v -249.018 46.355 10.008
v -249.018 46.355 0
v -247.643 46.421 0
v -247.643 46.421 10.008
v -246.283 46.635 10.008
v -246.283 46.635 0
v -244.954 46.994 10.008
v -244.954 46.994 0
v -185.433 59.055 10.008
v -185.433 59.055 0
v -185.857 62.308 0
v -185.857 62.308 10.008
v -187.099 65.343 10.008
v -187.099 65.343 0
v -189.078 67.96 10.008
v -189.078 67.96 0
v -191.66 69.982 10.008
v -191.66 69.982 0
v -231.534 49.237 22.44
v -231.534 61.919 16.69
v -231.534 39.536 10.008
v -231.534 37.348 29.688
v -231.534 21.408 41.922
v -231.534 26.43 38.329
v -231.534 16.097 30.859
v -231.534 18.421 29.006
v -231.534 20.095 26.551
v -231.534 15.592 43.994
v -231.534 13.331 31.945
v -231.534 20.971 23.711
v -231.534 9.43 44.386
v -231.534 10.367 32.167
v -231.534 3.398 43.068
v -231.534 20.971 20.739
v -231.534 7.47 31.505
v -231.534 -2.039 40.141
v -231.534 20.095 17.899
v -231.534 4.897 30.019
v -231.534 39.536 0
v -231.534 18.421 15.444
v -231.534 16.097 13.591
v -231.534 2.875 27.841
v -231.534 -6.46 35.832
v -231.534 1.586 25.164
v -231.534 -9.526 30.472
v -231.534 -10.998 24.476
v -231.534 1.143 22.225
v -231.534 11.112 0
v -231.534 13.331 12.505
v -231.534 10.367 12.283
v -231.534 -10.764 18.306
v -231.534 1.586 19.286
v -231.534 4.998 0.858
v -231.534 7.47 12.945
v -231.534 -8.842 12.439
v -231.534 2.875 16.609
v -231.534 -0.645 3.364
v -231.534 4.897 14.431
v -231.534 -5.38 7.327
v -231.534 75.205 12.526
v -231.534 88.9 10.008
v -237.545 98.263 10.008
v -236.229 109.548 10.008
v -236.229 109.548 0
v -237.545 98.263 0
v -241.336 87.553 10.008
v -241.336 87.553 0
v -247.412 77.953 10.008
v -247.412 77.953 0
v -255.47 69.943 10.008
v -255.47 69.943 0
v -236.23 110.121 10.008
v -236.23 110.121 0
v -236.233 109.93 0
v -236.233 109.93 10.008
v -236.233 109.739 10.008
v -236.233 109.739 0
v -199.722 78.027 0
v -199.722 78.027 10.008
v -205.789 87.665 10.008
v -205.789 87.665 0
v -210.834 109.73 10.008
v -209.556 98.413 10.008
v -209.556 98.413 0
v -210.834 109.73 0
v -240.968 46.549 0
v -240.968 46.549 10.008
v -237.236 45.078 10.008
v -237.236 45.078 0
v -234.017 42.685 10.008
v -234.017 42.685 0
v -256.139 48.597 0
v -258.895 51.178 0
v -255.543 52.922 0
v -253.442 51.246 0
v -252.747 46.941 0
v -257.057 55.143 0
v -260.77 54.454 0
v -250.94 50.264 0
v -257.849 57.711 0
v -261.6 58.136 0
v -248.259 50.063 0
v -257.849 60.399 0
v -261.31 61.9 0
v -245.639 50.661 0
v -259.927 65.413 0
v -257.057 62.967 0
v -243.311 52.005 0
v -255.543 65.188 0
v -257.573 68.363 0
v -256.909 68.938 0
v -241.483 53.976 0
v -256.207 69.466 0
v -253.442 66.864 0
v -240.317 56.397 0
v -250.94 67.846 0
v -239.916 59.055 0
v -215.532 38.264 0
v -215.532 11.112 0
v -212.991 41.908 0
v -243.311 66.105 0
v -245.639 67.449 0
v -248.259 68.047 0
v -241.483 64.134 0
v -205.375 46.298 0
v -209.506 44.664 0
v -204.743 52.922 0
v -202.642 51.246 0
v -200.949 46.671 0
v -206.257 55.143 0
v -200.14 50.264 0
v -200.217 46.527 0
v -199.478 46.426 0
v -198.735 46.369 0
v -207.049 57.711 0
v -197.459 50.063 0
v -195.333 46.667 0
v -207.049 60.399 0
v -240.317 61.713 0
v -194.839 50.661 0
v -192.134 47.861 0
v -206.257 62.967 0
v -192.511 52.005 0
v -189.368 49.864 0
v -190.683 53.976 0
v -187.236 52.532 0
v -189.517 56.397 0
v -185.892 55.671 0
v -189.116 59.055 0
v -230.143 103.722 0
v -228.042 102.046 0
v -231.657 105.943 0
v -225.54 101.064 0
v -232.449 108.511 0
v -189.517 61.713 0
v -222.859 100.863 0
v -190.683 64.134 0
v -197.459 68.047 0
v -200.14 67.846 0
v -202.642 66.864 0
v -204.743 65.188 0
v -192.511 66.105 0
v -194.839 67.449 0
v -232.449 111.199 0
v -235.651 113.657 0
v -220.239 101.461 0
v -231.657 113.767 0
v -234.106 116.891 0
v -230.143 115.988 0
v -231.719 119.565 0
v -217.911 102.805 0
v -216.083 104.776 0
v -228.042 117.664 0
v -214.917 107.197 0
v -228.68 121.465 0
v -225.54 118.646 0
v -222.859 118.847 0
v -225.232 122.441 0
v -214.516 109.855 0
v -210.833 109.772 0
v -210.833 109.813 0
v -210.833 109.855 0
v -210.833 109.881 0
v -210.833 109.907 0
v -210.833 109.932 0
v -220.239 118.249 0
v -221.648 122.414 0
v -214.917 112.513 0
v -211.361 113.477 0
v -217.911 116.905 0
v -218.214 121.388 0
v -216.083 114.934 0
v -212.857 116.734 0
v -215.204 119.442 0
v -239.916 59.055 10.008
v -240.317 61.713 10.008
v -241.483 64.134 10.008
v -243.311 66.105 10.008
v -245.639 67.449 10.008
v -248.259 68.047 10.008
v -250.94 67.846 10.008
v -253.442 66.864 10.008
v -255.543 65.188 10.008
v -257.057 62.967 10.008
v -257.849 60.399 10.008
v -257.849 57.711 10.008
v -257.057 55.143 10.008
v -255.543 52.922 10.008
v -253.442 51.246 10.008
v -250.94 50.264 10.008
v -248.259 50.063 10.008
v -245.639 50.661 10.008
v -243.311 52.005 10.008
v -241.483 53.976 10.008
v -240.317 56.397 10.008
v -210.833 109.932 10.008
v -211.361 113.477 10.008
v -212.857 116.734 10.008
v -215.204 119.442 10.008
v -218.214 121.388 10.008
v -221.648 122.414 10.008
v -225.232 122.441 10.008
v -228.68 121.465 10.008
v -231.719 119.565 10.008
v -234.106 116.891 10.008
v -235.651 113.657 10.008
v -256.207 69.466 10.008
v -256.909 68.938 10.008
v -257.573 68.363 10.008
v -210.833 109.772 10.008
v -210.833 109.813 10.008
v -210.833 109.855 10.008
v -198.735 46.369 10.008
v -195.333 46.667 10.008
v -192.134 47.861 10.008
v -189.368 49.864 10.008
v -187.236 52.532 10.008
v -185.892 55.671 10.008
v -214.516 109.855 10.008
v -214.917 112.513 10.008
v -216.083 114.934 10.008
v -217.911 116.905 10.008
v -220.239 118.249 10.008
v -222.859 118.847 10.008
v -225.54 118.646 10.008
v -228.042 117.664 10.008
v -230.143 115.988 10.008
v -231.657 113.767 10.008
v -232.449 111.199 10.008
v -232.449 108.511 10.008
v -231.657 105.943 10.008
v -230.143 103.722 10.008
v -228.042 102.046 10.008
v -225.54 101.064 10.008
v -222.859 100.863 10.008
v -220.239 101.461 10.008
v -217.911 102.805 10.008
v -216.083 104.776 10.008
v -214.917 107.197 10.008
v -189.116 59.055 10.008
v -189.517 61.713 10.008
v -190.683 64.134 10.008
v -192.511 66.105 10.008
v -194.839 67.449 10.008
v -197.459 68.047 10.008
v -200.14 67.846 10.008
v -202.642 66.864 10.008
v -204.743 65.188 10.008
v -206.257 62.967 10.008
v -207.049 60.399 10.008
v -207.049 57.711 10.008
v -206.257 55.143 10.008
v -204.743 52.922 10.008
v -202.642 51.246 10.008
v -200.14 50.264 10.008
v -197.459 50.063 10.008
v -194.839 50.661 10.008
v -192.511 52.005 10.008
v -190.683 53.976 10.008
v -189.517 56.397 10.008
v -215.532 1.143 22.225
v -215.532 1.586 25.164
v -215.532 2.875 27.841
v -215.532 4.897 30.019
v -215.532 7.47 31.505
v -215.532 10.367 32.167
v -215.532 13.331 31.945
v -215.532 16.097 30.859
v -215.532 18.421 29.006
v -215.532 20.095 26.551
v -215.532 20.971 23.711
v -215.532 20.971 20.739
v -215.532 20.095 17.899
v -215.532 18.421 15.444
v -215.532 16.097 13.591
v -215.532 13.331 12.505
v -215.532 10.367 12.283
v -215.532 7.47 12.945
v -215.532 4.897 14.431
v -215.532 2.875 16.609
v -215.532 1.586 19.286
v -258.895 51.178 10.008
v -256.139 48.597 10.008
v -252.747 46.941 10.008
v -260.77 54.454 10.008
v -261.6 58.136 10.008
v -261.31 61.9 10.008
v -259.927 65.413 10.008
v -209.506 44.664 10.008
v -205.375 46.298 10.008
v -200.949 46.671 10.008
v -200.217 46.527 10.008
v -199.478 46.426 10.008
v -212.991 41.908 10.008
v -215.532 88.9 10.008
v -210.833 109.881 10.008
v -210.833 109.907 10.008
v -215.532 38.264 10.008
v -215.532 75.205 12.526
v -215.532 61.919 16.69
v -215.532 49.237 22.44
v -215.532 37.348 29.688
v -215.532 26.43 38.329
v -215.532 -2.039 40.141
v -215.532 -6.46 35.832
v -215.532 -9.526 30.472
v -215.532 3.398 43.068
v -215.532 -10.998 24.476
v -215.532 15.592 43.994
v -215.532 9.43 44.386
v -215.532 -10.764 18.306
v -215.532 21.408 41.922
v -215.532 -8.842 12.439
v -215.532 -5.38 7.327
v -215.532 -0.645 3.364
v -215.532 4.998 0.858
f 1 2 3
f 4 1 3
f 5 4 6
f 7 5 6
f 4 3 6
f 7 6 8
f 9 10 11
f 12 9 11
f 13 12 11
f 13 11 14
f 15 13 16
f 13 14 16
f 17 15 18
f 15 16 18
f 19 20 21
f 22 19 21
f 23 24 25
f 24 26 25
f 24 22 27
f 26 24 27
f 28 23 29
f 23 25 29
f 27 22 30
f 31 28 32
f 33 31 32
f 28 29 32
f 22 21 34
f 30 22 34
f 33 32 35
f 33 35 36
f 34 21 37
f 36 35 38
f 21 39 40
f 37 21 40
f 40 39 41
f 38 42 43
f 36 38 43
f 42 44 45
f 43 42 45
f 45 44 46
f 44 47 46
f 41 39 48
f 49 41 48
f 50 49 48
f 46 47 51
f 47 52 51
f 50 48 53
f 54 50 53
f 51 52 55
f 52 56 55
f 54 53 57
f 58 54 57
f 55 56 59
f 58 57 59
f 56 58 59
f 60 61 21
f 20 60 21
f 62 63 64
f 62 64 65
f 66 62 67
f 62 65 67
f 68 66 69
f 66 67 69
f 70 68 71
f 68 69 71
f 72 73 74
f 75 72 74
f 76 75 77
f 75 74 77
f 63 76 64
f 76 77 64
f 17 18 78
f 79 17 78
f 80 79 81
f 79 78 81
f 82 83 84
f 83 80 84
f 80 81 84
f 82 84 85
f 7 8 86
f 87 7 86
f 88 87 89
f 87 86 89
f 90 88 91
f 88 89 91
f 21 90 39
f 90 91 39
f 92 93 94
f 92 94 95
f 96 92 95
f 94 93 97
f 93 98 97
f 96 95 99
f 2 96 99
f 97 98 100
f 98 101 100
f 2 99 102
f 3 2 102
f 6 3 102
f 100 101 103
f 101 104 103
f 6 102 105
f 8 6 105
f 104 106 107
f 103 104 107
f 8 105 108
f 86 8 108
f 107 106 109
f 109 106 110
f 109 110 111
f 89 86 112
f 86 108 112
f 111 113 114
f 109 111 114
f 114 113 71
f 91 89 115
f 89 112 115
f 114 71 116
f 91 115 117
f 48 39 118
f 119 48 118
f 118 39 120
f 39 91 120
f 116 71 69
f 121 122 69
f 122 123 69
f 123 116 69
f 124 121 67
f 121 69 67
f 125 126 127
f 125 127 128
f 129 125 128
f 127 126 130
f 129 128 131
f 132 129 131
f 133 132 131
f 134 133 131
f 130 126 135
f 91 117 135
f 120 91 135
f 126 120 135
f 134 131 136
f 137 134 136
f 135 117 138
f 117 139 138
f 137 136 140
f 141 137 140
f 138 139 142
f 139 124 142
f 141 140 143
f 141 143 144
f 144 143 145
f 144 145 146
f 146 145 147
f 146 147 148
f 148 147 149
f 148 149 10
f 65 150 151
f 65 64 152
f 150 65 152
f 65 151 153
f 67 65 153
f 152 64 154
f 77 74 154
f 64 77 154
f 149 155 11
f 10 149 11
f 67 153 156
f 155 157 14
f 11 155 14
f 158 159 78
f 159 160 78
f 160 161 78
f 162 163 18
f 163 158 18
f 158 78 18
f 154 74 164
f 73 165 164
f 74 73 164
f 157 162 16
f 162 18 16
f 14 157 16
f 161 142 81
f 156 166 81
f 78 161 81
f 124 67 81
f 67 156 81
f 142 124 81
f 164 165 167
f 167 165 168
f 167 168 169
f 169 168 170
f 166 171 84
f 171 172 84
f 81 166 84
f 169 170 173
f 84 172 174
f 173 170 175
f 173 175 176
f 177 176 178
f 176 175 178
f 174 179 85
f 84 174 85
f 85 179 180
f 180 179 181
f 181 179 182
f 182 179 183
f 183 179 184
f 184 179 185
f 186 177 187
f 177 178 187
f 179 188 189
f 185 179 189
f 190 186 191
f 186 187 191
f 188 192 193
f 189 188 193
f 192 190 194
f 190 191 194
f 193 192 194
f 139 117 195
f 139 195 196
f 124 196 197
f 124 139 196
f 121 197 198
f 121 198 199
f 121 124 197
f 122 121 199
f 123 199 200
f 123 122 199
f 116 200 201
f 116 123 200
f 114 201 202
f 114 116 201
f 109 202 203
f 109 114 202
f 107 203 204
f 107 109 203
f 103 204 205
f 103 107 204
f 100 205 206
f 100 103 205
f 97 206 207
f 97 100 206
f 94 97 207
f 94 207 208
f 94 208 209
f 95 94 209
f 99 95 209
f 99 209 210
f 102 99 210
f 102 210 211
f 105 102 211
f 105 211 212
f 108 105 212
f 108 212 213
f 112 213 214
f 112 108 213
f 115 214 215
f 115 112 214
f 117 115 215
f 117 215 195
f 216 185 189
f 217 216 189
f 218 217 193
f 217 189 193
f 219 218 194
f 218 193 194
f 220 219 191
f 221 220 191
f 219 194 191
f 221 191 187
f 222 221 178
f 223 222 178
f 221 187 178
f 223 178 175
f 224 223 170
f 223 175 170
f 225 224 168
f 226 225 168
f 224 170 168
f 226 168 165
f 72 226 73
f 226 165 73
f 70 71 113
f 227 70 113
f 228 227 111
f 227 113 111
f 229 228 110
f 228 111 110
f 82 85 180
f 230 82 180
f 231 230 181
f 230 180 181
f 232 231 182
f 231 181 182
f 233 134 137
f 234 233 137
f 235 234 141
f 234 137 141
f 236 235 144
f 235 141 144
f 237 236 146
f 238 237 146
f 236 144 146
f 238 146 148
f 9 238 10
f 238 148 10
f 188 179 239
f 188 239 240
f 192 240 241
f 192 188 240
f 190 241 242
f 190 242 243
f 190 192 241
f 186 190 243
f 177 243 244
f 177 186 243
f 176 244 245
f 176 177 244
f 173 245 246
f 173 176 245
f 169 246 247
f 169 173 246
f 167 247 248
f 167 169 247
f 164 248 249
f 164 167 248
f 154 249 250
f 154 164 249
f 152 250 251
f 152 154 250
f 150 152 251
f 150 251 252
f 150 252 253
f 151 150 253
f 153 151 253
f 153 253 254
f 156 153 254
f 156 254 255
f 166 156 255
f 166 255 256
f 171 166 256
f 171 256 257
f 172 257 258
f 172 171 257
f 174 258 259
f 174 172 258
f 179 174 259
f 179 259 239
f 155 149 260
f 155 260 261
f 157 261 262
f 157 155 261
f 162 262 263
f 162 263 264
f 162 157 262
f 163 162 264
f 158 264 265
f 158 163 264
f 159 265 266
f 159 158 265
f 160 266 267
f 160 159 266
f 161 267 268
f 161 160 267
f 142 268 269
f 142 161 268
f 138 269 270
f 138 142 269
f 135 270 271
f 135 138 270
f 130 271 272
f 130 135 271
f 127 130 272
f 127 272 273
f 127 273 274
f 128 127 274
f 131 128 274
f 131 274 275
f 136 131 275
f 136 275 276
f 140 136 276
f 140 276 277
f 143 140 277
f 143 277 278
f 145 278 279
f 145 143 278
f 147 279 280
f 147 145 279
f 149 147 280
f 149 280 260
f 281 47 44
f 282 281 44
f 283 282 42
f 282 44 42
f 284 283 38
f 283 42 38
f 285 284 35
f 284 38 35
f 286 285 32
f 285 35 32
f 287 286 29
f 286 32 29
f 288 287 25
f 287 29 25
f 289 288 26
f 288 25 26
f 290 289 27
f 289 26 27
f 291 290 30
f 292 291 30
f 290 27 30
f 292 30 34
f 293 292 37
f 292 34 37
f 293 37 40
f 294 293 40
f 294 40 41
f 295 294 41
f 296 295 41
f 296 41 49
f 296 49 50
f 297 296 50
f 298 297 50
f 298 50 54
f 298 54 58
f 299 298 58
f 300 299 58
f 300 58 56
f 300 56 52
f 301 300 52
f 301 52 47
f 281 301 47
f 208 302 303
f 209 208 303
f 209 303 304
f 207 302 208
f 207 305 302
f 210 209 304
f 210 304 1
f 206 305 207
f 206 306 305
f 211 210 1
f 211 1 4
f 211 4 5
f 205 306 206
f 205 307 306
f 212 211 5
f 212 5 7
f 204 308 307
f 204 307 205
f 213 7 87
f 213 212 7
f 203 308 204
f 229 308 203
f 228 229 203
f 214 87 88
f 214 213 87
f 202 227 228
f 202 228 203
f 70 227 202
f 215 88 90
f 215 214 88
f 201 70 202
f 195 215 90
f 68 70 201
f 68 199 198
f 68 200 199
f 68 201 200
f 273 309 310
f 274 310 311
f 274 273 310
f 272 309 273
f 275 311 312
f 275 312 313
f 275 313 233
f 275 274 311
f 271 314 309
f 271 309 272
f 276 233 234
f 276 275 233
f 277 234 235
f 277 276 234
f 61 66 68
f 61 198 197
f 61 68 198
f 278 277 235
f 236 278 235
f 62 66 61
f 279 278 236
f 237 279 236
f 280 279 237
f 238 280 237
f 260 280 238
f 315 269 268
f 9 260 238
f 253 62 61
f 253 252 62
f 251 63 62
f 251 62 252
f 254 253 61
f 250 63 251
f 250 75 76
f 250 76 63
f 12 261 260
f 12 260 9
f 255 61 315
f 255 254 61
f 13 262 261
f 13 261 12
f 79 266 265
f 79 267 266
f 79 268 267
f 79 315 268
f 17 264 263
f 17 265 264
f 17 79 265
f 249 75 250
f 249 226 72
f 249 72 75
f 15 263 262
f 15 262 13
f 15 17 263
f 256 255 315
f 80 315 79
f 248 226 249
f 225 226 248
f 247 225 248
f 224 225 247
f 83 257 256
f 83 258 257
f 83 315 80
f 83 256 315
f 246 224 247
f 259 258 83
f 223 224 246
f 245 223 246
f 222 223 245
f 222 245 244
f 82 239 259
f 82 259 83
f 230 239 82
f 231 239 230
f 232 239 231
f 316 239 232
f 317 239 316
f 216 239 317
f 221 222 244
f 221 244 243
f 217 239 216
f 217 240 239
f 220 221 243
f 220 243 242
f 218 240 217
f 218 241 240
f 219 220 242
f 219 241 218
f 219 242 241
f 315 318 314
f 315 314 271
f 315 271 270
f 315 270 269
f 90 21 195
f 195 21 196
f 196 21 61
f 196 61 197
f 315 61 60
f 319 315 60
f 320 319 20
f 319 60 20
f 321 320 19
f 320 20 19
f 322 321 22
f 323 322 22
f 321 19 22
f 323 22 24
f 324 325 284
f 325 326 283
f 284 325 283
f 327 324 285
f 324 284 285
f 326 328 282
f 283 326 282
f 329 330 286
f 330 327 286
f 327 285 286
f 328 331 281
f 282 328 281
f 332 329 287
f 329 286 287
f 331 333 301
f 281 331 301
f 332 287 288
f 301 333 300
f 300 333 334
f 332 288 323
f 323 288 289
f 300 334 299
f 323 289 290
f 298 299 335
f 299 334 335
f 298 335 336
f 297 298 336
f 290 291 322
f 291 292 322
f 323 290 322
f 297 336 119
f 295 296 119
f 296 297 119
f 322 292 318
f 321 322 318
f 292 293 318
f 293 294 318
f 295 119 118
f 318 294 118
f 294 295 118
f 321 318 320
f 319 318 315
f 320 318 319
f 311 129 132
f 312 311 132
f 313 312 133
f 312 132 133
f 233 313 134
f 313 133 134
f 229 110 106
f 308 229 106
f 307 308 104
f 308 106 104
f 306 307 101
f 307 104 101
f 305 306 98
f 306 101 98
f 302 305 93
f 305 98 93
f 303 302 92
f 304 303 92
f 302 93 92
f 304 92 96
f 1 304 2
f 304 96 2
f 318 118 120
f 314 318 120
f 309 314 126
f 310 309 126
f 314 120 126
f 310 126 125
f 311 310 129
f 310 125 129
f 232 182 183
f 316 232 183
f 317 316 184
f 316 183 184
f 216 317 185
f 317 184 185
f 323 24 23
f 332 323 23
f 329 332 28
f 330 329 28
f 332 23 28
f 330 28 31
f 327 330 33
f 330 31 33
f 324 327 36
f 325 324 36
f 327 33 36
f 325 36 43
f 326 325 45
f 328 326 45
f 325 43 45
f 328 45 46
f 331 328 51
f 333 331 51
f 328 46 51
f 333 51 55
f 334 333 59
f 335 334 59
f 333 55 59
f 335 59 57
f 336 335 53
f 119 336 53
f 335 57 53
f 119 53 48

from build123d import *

# Parameters (mm, degrees)
F0_W     = 16.002
F0_H     = 11.1125
F1_DEPTH = 76.2
F0_R     = 9.017
F2_DEPTH = 10.0076
F3_R     = 9.9695
F4_DEPTH = 25.4


# Not quite as in the source:
# - a feature names something its author has since deleted; it is built from what else it names


with BuildPart() as f1:
    # F0 (on Top) → F1 (new body)
    with BuildSketch(Plane.XY):
        Polygon((-215.5320961376, 0), (-215.5320961376, 38.263771664), (-215.5320961376, 88.9), (-231.5340961376, 88.9), (-231.5340961376, 39.535600692), (-231.5340961376, 0), align=None)
        with Locations((-223.5330961376, -5.55625)):
            Rectangle(F0_W, F0_H)
    extrude(amount=F1_DEPTH)

    # F0 (on Top) → F2 (join)
    with BuildSketch(Plane.XY):
        with BuildLine():
            ThreePointArc((-210.8337106802, 109.7300639993), (-210.8332497742, 109.7925312439), (-210.8330961376, 109.855))
            ThreePointArc((-210.8330961376, 109.855), (-210.8331549592, 109.8936531274), (-210.8333314233, 109.9323058968))
            ThreePointArc((-210.8333314233, 109.9323058968), (-210.8336216962, 109.8311851368), (-210.8337106802, 109.7300639993))
        make_face()
        with BuildLine():
            ThreePointArc((-210.8337106802, 109.7300639993), (-210.8336216962, 109.8311851368), (-210.8333314233, 109.9323058968))
            ThreePointArc((-210.8333314233, 109.9323058968), (-223.438898877, 122.5546506596), (-236.2303167947, 110.12068324))
            ThreePointArc((-236.2303167947, 110.12068324), (-236.2290424274, 109.8342939205), (-236.229382634, 109.5479019679))
            ThreePointArc((-236.229382634, 109.5479019679), (-223.4420019429, 97.1553267031), (-210.8337106802, 109.7300639993))
        make_face()
        with Locations((-223.5330961376, 109.855)):
            Circle(F0_R, mode=Mode.SUBTRACT)
        with BuildLine():
            ThreePointArc((-191.660374853, 69.9817506227), (-205.7887196825, 87.6651452552), (-210.8337106802, 109.7300639993))
            ThreePointArc((-210.8337106802, 109.7300639993), (-223.4420019429, 97.1553267031), (-236.229382634, 109.5479019679))
            ThreePointArc((-236.229382634, 109.5479019679), (-241.3359242696, 87.5526791762), (-255.4702109751, 69.9433483413))
            ThreePointArc((-255.4702109751, 69.9433483413), (-242.6773531137, 70.1074060375), (-236.2330961376, 59.055))
            ThreePointArc((-236.2330961376, 59.055), (-238.6417428115, 51.6133572568), (-244.9540483765, 46.9944370399))
            ThreePointArc((-244.9540483765, 46.9944370399), (-237.2361698926, 45.078438676), (-231.5340961376, 39.535600692))
            Line((-231.5340961376, 39.535600692), (-231.5340961376, 88.9))
            Line((-231.5340961376, 88.9), (-215.5320961376, 88.9))
            Line((-215.5320961376, 88.9), (-215.5320961376, 38.263771664))
            ThreePointArc((-215.5320961376, 38.263771664), (-209.5064918471, 44.6635464864), (-200.94875069, 46.6710551745))
            ThreePointArc((-200.94875069, 46.6710551745), (-209.9310054796, 63.7559929971), (-191.660374853, 69.9817506227))
        make_face()
        with BuildLine():
            ThreePointArc((-236.229382634, 109.5479019679), (-236.2290424274, 109.8342939205), (-236.2303167947, 110.12068324))
            ThreePointArc((-236.2303167947, 110.12068324), (-236.2330792473, 109.8342873368), (-236.229382634, 109.5479019679))
        make_face()
        with BuildLine():
            ThreePointArc((-185.4330961376, 59.055), (-187.0992037982, 65.343339991), (-191.660374853, 69.9817506227))
            ThreePointArc((-191.660374853, 69.9817506227), (-209.9310054796, 63.7559929971), (-200.94875069, 46.6710551745))
            ThreePointArc((-200.94875069, 46.6710551745), (-199.8363704021, 46.5607848043), (-198.7350651606, 46.3692744277))
            ThreePointArc((-198.7350651606, 46.3692744277), (-189.3682517748, 49.8643796022), (-185.4330961376, 59.055))
        make_face()
        with Locations((-198.1330961376, 59.055)):
            Circle(F0_R, mode=Mode.SUBTRACT)
        with BuildLine():
            ThreePointArc((-257.5728060865, 68.3633517337), (-256.5112816453, 69.1397405149), (-255.4702109751, 69.9433483413))
            ThreePointArc((-255.4702109751, 69.9433483413), (-256.5625194428, 69.2079256882), (-257.5728060865, 68.3633517337))
        make_face()
        with BuildLine():
            ThreePointArc((-236.2330961376, 59.055), (-242.6773531137, 70.1074060375), (-255.4702109751, 69.9433483413))
            ThreePointArc((-255.4702109751, 69.9433483413), (-256.5112816453, 69.1397405149), (-257.5728060865, 68.3633517337))
            ThreePointArc((-257.5728060865, 68.3633517337), (-260.7702508926, 54.4537211227), (-249.0179411736, 46.3552834158))
            ThreePointArc((-249.0179411736, 46.3552834158), (-247.0076603385, 46.8126151022), (-244.9540483765, 46.9944370399))
            ThreePointArc((-244.9540483765, 46.9944370399), (-238.6417428115, 51.6133572568), (-236.2330961376, 59.055))
        make_face()
        with Locations((-248.9330961376, 59.055)):
            Circle(F0_R, mode=Mode.SUBTRACT)
        with BuildLine():
            ThreePointArc((-198.7350651606, 46.3692744277), (-199.8363704021, 46.5607848043), (-200.94875069, 46.6710551745))
            ThreePointArc((-200.94875069, 46.6710551745), (-199.8485569009, 46.4713918382), (-198.7350651606, 46.3692744277))
        make_face()
        Polygon((-215.5320961376, 0), (-215.5320961376, 38.263771664), (-215.5320961376, 88.9), (-231.5340961376, 88.9), (-231.5340961376, 39.535600692), (-231.5340961376, 0), align=None)
        with BuildLine():
            ThreePointArc((-249.0179411736, 46.3552834158), (-246.9599430632, 46.5092171649), (-244.9540483765, 46.9944370399))
            ThreePointArc((-244.9540483765, 46.9944370399), (-247.0076603385, 46.8126151022), (-249.0179411736, 46.3552834158))
        make_face()
        with Locations((-223.5330961376, -5.55625)):
            Rectangle(F0_W, F0_H)
    extrude(amount=F2_DEPTH)

    # F3 (on face) → F4 (cut)
    with BuildSketch(Plane(origin=(-231.5340961376, 0, 0), x_dir=(0, -1, 0), z_dir=(-1, 0, 0))):
        with BuildLine():
            ThreePointArc((-26.4295804615, 38.3289644541), (-2.3509786782, 42.6501406146), (11.1125, 22.225))
            Line((11.1125, 22.225), (11.1125, 76.2))
            Line((11.1125, 76.2), (-88.9, 76.2))
            Line((-88.9, 76.2), (-88.9, 10.0076))
            ThreePointArc((-88.9, 10.0076), (-55.490267729, 19.3717854622), (-26.4295804615, 38.3289644541))
        make_face()
        with Locations((-11.1125, 22.225)):
            Circle(F3_R)
        with BuildLine():
            Line((11.1125, 0), (11.1125, 22.225))
            ThreePointArc((11.1125, 22.225), (4.6029482119, 6.5095517881), (-11.1125, 0))
            Line((-11.1125, 0), (0, 0))
            Line((0, 0), (11.1125, 0))
        make_face()
    extrude(amount=-F4_DEPTH, mode=Mode.SUBTRACT)


solid = f1.part
